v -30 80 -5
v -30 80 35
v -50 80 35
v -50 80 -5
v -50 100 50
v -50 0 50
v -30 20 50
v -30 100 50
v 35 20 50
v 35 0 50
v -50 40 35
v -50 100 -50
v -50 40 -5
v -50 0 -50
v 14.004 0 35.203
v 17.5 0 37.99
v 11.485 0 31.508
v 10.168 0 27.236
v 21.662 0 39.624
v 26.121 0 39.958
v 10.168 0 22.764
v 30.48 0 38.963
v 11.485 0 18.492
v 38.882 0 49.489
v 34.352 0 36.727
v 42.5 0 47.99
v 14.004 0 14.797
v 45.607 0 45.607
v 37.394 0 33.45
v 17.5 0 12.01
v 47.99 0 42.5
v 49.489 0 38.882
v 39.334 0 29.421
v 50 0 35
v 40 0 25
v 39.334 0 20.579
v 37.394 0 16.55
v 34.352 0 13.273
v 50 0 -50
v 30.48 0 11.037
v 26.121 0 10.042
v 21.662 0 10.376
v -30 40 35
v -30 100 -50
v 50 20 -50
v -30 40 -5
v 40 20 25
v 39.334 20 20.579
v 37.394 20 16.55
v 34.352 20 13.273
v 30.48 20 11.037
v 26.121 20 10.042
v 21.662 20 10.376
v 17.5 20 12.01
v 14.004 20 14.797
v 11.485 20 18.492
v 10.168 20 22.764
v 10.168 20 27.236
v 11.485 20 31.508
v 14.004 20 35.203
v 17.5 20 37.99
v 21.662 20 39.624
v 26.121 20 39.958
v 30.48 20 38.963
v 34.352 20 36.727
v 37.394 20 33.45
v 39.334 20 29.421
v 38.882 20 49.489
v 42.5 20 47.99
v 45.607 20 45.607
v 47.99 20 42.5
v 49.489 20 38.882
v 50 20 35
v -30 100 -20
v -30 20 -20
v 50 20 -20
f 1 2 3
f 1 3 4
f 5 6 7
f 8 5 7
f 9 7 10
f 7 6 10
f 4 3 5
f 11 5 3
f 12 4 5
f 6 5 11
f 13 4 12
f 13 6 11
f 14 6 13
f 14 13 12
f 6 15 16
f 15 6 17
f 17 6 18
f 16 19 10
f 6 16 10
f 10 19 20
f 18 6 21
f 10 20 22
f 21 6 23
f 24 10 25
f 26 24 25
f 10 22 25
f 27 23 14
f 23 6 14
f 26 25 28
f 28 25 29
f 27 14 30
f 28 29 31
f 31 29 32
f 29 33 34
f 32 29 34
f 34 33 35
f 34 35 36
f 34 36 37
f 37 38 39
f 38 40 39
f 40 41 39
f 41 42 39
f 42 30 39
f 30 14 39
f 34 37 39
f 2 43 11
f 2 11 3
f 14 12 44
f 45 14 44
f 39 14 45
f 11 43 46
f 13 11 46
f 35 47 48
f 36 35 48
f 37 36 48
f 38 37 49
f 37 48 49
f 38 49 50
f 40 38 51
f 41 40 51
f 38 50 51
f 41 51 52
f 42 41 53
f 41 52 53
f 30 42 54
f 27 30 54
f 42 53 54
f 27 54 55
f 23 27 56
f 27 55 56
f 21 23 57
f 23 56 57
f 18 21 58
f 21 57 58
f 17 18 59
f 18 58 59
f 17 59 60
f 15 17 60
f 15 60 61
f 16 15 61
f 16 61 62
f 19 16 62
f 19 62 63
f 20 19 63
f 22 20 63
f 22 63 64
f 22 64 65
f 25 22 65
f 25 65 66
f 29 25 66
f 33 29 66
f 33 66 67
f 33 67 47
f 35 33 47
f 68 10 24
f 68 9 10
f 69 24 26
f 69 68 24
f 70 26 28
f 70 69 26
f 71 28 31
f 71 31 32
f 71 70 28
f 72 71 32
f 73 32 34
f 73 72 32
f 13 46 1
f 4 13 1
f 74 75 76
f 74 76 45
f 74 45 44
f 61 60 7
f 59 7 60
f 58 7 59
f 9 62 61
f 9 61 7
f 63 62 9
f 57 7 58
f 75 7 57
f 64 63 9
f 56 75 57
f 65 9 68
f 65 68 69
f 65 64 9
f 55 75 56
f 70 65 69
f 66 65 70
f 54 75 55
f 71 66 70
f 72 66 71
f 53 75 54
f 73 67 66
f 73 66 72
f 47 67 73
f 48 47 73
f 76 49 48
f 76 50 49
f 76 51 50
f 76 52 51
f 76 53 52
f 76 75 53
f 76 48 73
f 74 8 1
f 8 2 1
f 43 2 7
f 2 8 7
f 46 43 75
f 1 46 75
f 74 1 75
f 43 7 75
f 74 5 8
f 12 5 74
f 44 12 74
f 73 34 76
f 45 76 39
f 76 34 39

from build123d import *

# Parameters (mm, degrees)
CROQUIS1_W              = 100
CROQUIS1_H              = 100
SALIENTE_EXTRUIR1_DEPTH = 20
CROQUIS2_W              = 20
CROQUIS2_H              = 100
SALIENTE_EXTRUIR2_DEPTH = 80
CROQUIS3_W              = 80
CROQUIS3_H              = 30
SALIENTE_EXTRUIR3_DEPTH = 80
CORTAR_EXTRUIR1_DEPTH   = 80
CROQUIS5_R              = 15
CORTAR_EXTRUIR2_DEPTH   = 80
REDONDEO1_R             = 15
CROQUIS6_W              = 40
CROQUIS6_H              = 40
CORTAR_EXTRUIR3_DEPTH   = 80


with BuildPart() as part:
    # Croquis1 → Saliente-Extruir1 (new body)
    with BuildSketch(Plane(origin=(0, 0, 0), x_dir=(1, 0, 0), z_dir=(0, 1, 0))):
        Rectangle(CROQUIS1_W, CROQUIS1_H)
    extrude(amount=SALIENTE_EXTRUIR1_DEPTH)

    # Croquis2 → Saliente-Extruir2 (add)
    with BuildSketch(Plane(origin=(0, 20, 0), x_dir=(1, 0, 0), z_dir=(0, 1, 0))):
        with Locations((-40, 0)):
            Rectangle(CROQUIS2_W, CROQUIS2_H)
    extrude(amount=SALIENTE_EXTRUIR2_DEPTH)

    # Croquis3 → Saliente-Extruir3 (add)
    with BuildSketch(Plane(origin=(0, 20, 0), x_dir=(1, 0, 0), z_dir=(0, 1, 0))):
        with Locations((10, 35)):
            Rectangle(CROQUIS3_W, CROQUIS3_H)
    extrude(amount=SALIENTE_EXTRUIR3_DEPTH)

    # Croquis4 → Cortar-Extruir1 (cut)
    with BuildSketch(Plane.XY.offset(-20)):
        Polygon((50, 20), (-30, 100), (50, 100), align=None)
    extrude(amount=-CORTAR_EXTRUIR1_DEPTH, mode=Mode.SUBTRACT)

    # Croquis5 → Cortar-Extruir2 (cut)
    with BuildSketch(Plane(origin=(0, 20, 0), x_dir=(1, 0, 0), z_dir=(0, 1, 0))):
        with Locations((25, -25)):
            Circle(CROQUIS5_R)
    extrude(amount=-CORTAR_EXTRUIR2_DEPTH, mode=Mode.SUBTRACT)

    # Redondeo1
    redondeo1_edges = [part.edges().sort_by_distance(p)[0] for p in [
        (50, 10, 50),
    ]]
    fillet(redondeo1_edges, radius=REDONDEO1_R)

    # Croquis6 → Cortar-Extruir3 (cut)
    with BuildSketch(Plane(origin=(-30, 0, 0), x_dir=(0, 0, -1), z_dir=(1, 0, 0))):
        with Locations((-15, 60)):
            Rectangle(CROQUIS6_W, CROQUIS6_H)
    extrude(amount=-CORTAR_EXTRUIR3_DEPTH, mode=Mode.SUBTRACT)


solid = part.part
